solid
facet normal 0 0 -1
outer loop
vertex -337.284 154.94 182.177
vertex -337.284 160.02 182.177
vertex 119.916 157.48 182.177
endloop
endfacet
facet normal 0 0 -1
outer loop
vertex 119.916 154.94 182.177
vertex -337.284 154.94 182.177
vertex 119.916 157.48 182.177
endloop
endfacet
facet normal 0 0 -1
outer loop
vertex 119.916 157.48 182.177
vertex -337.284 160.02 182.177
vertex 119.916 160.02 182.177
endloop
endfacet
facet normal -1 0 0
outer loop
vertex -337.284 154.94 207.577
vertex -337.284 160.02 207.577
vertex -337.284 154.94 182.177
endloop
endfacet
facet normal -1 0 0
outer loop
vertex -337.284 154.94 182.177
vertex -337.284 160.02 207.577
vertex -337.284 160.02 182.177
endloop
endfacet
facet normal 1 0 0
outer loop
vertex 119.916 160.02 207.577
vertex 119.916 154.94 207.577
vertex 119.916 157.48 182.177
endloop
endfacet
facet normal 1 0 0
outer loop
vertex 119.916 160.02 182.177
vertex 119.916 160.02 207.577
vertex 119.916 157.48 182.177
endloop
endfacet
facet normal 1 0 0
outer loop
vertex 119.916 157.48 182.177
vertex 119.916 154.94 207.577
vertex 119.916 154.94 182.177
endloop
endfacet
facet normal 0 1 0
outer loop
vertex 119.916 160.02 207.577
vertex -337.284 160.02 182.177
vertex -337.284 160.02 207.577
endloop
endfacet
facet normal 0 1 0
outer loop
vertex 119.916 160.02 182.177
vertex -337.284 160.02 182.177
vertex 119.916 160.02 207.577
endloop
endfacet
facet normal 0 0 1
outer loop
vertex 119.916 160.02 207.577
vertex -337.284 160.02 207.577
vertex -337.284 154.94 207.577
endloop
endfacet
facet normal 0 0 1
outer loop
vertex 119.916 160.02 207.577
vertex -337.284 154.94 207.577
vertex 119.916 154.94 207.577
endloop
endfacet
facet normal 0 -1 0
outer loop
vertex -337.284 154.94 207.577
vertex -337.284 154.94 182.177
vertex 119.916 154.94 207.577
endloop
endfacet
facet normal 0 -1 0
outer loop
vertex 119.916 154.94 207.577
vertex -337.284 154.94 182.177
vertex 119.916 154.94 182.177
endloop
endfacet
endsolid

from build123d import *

# Parameters (mm, degrees)
SKETCH1_W           = 381
SKETCH1_H           = 381
BOSS_EXTRUDE1_DEPTH = 25.4
FILLET1_R           = 25.4
BOSS_EXTRUDE2_START = 127
BOSS_EXTRUDE2_DEPTH = 127
FILLET5_R           = 2.54
FILLET6_R           = 2.54
SKETCH3_W           = 381
SKETCH3_H           = 45.536829563
BOSS_EXTRUDE3_DEPTH = 127
CUT_EXTRUDE1_START  = -127
CUT_EXTRUDE1_DEPTH  = 127
CUT_EXTRUDE2_START  = -127
CUT_EXTRUDE2_DEPTH  = 127
SKETCH7_W           = 159.592910526
SKETCH7_H           = 279.668363548
CUT_EXTRUDE3_DEPTH  = 540.805557869
CUT_EXTRUDE4_DEPTH  = 121.92
SKETCH10_W          = 12.830407975
SKETCH10_H          = 5.381034355
SKETCH10_W_2        = 12.189915085
SKETCH10_H_2        = 7.553204363
BOSS_EXTRUDE4_DEPTH = 5.08
SKETCH12_W          = 381
SKETCH12_H          = 5.08
BOSS_EXTRUDE5_DEPTH = 5.842
SKETCH14_W          = 25.4
SKETCH14_H          = 25.4
BOSS_EXTRUDE6_DEPTH = 5.08
SKETCH15_W          = 381
SKETCH15_H          = 25.4
BOSS_EXTRUDE7_DEPTH = 2.54
SKETCH18_W          = 25.978829563
SKETCH18_H          = 5.08
CUT_EXTRUDE6_DEPTH  = 463.44511455
SKETCH19_W          = 25.4
SKETCH19_H          = 2.54
CUT_EXTRUDE7_DEPTH  = 463.44511455
SKETCH21_W          = 76.2
SKETCH21_H          = 25.4
BOSS_EXTRUDE8_DEPTH = 5.08


with BuildPart() as part:
    # Sketch1 → Boss-Extrude1 (new body)
    with BuildSketch(Plane(origin=(0, 0, 0), x_dir=(1, 0, 0), z_dir=(0, 1, 0))):
        with Locations((-70.583665339, -17.076693227)):
            Rectangle(SKETCH1_W, SKETCH1_H)
    extrude(amount=BOSS_EXTRUDE1_DEPTH)

    # Fillet1
    fillet1_edges = [part.edges().sort_by_distance(p)[0] for p in [
        (-261.083665339, 12.7, -173.423306773),
        (119.916334661, 12.7, -173.423306773),
        (119.916334661, 12.7, 207.576693227),
        (-261.083665339, 12.7, 207.576693227),
    ]]
    fillet(fillet1_edges, radius=FILLET1_R)

    # Sketch2 → Boss-Extrude2 (add)
    with BuildSketch(Plane(origin=(0, 25.4, 0), x_dir=(1, 0, 0), z_dir=(0, 1, 0)).offset(BOSS_EXTRUDE2_START)):
        with BuildLine():
            ThreePointArc((94.516334661, -207.576693227), (112.476846903, -200.137205469), (119.916334661, -182.176693227))
            Line((119.916334661, -182.176693227), (119.916334661, -162.77058906))
            ThreePointArc((119.916334661, -162.77058906), (115.157902312, -162.131654008), (110.356896004, -162.096230085))
            Line((110.356896004, -162.096230085), (110.356896004, -169.819933243))
            ThreePointArc((110.356896004, -169.819933243), (110.63661406, -173.531591416), (110.356896004, -177.243249589))
            ThreePointArc((110.356896004, -177.243249589), (103.383001842, -191.043360408), (89.582891024, -198.017254569))
            ThreePointArc((89.582891024, -198.017254569), (85.871232851, -198.296972625), (82.159574678, -198.017254569))
            Line((82.159574678, -198.017254569), (74.435871519, -198.017254569))
            ThreePointArc((74.435871519, -198.017254569), (74.471295442, -202.818260878), (75.110230494, -207.576693227))
            Line((75.110230494, -207.576693227), (94.516334661, -207.576693227))
        make_face()
        with BuildLine():
            ThreePointArc((110.356896004, 127.942843631), (115.157902312, 127.978267553), (119.916334661, 128.617202605))
            Line((119.916334661, 128.617202605), (119.916334661, 148.023306773))
            ThreePointArc((119.916334661, 148.023306773), (112.476846903, 165.983819015), (94.516334661, 173.423306773))
            Line((94.516334661, 173.423306773), (75.110230494, 173.423306773))
            ThreePointArc((75.110230494, 173.423306773), (74.471295442, 168.664874423), (74.435871519, 163.863868115))
            Line((74.435871519, 163.863868115), (82.159574678, 163.863868115))
            ThreePointArc((82.159574678, 163.863868115), (85.871232851, 164.143586171), (89.582891024, 163.863868115))
            ThreePointArc((89.582891024, 163.863868115), (103.383001842, 156.889973954), (110.356896004, 143.089863135))
            ThreePointArc((110.356896004, 143.089863135), (110.63661406, 139.378204962), (110.356896004, 135.666546789))
            Line((110.356896004, 135.666546789), (110.356896004, 127.942843631))
        make_face()
        with BuildLine():
            Line((-235.683665339, -207.576693227), (-216.277561171, -207.576693227))
            ThreePointArc((-216.277561171, -207.576693227), (-215.638626119, -202.818260878), (-215.603202197, -198.017254569))
            Line((-215.603202197, -198.017254569), (-223.326905355, -198.017254569))
            ThreePointArc((-223.326905355, -198.017254569), (-227.038563528, -198.296972625), (-230.750221701, -198.017254569))
            ThreePointArc((-230.750221701, -198.017254569), (-244.55033252, -191.043360408), (-251.524226681, -177.243249589))
            ThreePointArc((-251.524226681, -177.243249589), (-251.803944737, -173.531591416), (-251.524226681, -169.819933243))
            Line((-251.524226681, -169.819933243), (-251.524226681, -162.096230085))
            ThreePointArc((-251.524226681, -162.096230085), (-256.325232989, -162.131654008), (-261.083665339, -162.77058906))
            Line((-261.083665339, -162.77058906), (-261.083665339, -182.176693227))
            ThreePointArc((-261.083665339, -182.176693227), (-253.644177581, -200.137205469), (-235.683665339, -207.576693227))
        make_face()
        with BuildLine():
            ThreePointArc((-215.603202197, 163.863868115), (-215.638626119, 168.664874423), (-216.277561171, 173.423306773))
            Line((-216.277561171, 173.423306773), (-235.683665339, 173.423306773))
            ThreePointArc((-235.683665339, 173.423306773), (-253.644177581, 165.983819015), (-261.083665339, 148.023306773))
            Line((-261.083665339, 148.023306773), (-261.083665339, 128.617202605))
            ThreePointArc((-261.083665339, 128.617202605), (-256.325232989, 127.978267553), (-251.524226681, 127.942843631))
            Line((-251.524226681, 127.942843631), (-251.524226681, 135.666546789))
            ThreePointArc((-251.524226681, 135.666546789), (-251.803944737, 139.378204962), (-251.524226681, 143.089863135))
            ThreePointArc((-251.524226681, 143.089863135), (-244.55033252, 156.889973954), (-230.750221701, 163.863868115))
            ThreePointArc((-230.750221701, 163.863868115), (-227.038563528, 164.143586171), (-223.326905355, 163.863868115))
            Line((-223.326905355, 163.863868115), (-215.603202197, 163.863868115))
        make_face()
    extrude(amount=-BOSS_EXTRUDE2_DEPTH)

    # Fillet5
    fillet5_edges = [part.edges().sort_by_distance(p)[0] for p in [
        (74.435871519, 88.9, -163.863868115),
        (110.356896004, 88.9, -127.942843631),
        (119.916334661, 88.9, -128.617202605),
        (75.110230494, 88.9, -173.423306773),
    ]]
    fillet(fillet5_edges, radius=FILLET5_R)

    # Fillet6
    fillet6_edges = [part.edges().sort_by_distance(p)[0] for p in [
        (-215.603202197, 88.9, -163.863868115),
        (-216.277561171, 88.9, -173.423306773),
        (-261.083665339, 88.9, -128.617202605),
        (-251.524226681, 88.9, -127.942843631),
        (74.435871519, 88.9, 198.017254569),
        (75.110230494, 88.9, 207.576693227),
        (119.916334661, 88.9, 162.77058906),
        (110.356896004, 88.9, 162.096230085),
        (-216.277561171, 88.9, 207.576693227),
        (-215.603202197, 88.9, 198.017254569),
        (-251.524226681, 88.9, 162.096230085),
        (-261.083665339, 88.9, 162.77058906),
    ]]
    fillet(fillet6_edges, radius=FILLET6_R)

    # Sketch3 → Boss-Extrude3 (add)
    with BuildSketch(Plane(origin=(0, 152.4, 0), x_dir=(1, 0, 0), z_dir=(0, 1, 0))):
        with Locations((-70.583665339, -184.808278446)):
            Rectangle(SKETCH3_W, SKETCH3_H)
    extrude(amount=BOSS_EXTRUDE3_DEPTH)

    # Sketch5 → Cut-Extrude1 (cut)
    with BuildSketch(Plane.XZ.offset(-152.4).offset(CUT_EXTRUDE1_START)):
        with BuildLine():
            Line((-261.083665339, 162.039863664), (-261.083665339, 164.916350572))
            ThreePointArc((-261.083665339, 164.916350572), (-260.459455915, 163.248613642), (-258.89362875, 162.400575222))
            ThreePointArc((-258.89362875, 162.400575222), (-256.499630965, 162.144358959), (-254.094230188, 162.039863664))
            Line((-254.094230188, 162.039863664), (-261.083665339, 162.039863664))
        make_face()
        with BuildLine():
            Line((-261.083665339, 207.576693227), (-235.683665339, 207.576693227))
            ThreePointArc((-235.683665339, 207.576693227), (-253.644177581, 200.137205469), (-261.083665339, 182.176693227))
            Line((-261.083665339, 182.176693227), (-261.083665339, 207.576693227))
        make_face()
    extrude(amount=CUT_EXTRUDE1_DEPTH, mode=Mode.SUBTRACT)

    # Sketch6 → Cut-Extrude2 (cut)
    with BuildSketch(Plane.XZ.offset(-152.4).offset(CUT_EXTRUDE2_START)):
        with BuildLine():
            Line((119.916334661, 162.039863664), (112.926899511, 162.039863664))
            ThreePointArc((112.926899511, 162.039863664), (115.332300288, 162.144358959), (117.726298073, 162.400575222))
            ThreePointArc((117.726298073, 162.400575222), (119.292125238, 163.248613642), (119.916334661, 164.916350572))
            Line((119.916334661, 164.916350572), (119.916334661, 162.039863664))
        make_face()
        with BuildLine():
            Line((119.916334661, 207.576693227), (119.916334661, 182.176693227))
            ThreePointArc((119.916334661, 182.176693227), (112.476846903, 200.137205469), (94.516334661, 207.576693227))
            Line((94.516334661, 207.576693227), (119.916334661, 207.576693227))
        make_face()
    extrude(amount=CUT_EXTRUDE2_DEPTH, mode=Mode.SUBTRACT)

    # Sketch7 → Cut-Extrude3 (cut, through all)
    with BuildSketch(Plane.XY.offset(207.576693227)):
        with Locations((-277.192611624, 12.565818226)):
            Rectangle(SKETCH7_W, SKETCH7_H)
        Polygon((188.205407311, 152.4), (-197.396156361, 152.4), (-197.396156361, -127.268363548), (-197.396156361, -138.930106511), (188.205407311, -138.930106511), align=None)
    extrude(amount=-CUT_EXTRUDE3_DEPTH, mode=Mode.SUBTRACT)

    # Sketch9 → Cut-Extrude4 (cut)
    with BuildSketch(Plane(origin=(0, 279.4, 0), x_dir=(1, 0, 0), z_dir=(0, 1, 0))):
        with BuildLine():
            Line((112.926899511, -162.039863664), (-254.094230188, -162.039863664))
            ThreePointArc((-254.094230188, -162.039863664), (-256.499630965, -162.144358959), (-258.89362875, -162.400575222))
            ThreePointArc((-258.89362875, -162.400575222), (-260.459455915, -163.248613642), (-261.083665339, -164.916350572))
            Line((-261.083665339, -164.916350572), (-261.083665339, -182.176693227))
            ThreePointArc((-261.083665339, -182.176693227), (-253.644177581, -200.137205469), (-235.683665339, -207.576693227))
            Line((-235.683665339, -207.576693227), (94.516334661, -207.576693227))
            ThreePointArc((94.516334661, -207.576693227), (112.476846903, -200.137205469), (119.916334661, -182.176693227))
            Line((119.916334661, -182.176693227), (119.916334661, -164.916350572))
            ThreePointArc((119.916334661, -164.916350572), (119.292125238, -163.248613642), (117.726298073, -162.400575222))
            ThreePointArc((117.726298073, -162.400575222), (115.332300288, -162.144358959), (112.926899511, -162.039863664))
        make_face()
    extrude(amount=-CUT_EXTRUDE4_DEPTH, mode=Mode.SUBTRACT)

    # Sketch10 → Boss-Extrude4 (add)
    with BuildSketch(Plane(origin=(0, 157.48, 0), x_dir=(1, 0, 0), z_dir=(0, 1, 0))):
        with Locations((-254.668461352, -164.730380842)):
            Rectangle(SKETCH10_W, SKETCH10_H)
        with Locations((113.821377119, -165.816465846)):
            Rectangle(SKETCH10_W_2, SKETCH10_H_2)
    extrude(amount=-BOSS_EXTRUDE4_DEPTH)

    # Sketch12 → Boss-Extrude5 (add)
    with BuildSketch(Plane(origin=(0, 0, 162.039863664), x_dir=(-1, 0, 0), z_dir=(0, 0, -1))):
        with Locations((70.583665339, 154.94)):
            Rectangle(SKETCH12_W, SKETCH12_H)
    extrude(amount=BOSS_EXTRUDE5_DEPTH)

    # Sketch14 → Boss-Extrude6 (add)
    with BuildSketch(Plane(origin=(0, 157.48, 0), x_dir=(1, 0, 0), z_dir=(0, 1, 0))):
        with Locations((107.216334661, -194.876693227)):
            Rectangle(SKETCH14_W, SKETCH14_H)
        with Locations((-248.383665339, -194.876693227)):
            Rectangle(SKETCH14_W, SKETCH14_H)
    extrude(amount=-BOSS_EXTRUDE6_DEPTH)

    # Sketch15 → Boss-Extrude7 (add)
    with BuildSketch(Plane(origin=(0, 157.48, 0), x_dir=(1, 0, 0), z_dir=(0, 1, 0))):
        with Locations((-70.583665339, -194.876693227)):
            Rectangle(SKETCH15_W, SKETCH15_H)
    extrude(amount=BOSS_EXTRUDE7_DEPTH)

    # Sketch18 → Cut-Extrude6 (cut, through all)
    with BuildSketch(Plane.ZY.offset(261.083665339)):
        with Locations((169.187278445, 154.94)):
            Rectangle(SKETCH18_W, SKETCH18_H)
    extrude(amount=-CUT_EXTRUDE6_DEPTH, mode=Mode.SUBTRACT)

    # Sketch19 → Cut-Extrude7 (cut, through all)
    with BuildSketch(Plane.ZY.offset(261.083665339)):
        with Locations((194.876693227, 153.67)):
            Rectangle(SKETCH19_W, SKETCH19_H)
    extrude(amount=-CUT_EXTRUDE7_DEPTH, mode=Mode.SUBTRACT)

    # Sketch21 → Boss-Extrude8 (add)
    with BuildSketch(Plane(origin=(0, 160.02, 0), x_dir=(1, 0, 0), z_dir=(0, 1, 0))):
        with Locations((-299.183665339, -194.876693227)):
            Rectangle(SKETCH21_W, SKETCH21_H)
    extrude(amount=-BOSS_EXTRUDE8_DEPTH)


solid = part.part
